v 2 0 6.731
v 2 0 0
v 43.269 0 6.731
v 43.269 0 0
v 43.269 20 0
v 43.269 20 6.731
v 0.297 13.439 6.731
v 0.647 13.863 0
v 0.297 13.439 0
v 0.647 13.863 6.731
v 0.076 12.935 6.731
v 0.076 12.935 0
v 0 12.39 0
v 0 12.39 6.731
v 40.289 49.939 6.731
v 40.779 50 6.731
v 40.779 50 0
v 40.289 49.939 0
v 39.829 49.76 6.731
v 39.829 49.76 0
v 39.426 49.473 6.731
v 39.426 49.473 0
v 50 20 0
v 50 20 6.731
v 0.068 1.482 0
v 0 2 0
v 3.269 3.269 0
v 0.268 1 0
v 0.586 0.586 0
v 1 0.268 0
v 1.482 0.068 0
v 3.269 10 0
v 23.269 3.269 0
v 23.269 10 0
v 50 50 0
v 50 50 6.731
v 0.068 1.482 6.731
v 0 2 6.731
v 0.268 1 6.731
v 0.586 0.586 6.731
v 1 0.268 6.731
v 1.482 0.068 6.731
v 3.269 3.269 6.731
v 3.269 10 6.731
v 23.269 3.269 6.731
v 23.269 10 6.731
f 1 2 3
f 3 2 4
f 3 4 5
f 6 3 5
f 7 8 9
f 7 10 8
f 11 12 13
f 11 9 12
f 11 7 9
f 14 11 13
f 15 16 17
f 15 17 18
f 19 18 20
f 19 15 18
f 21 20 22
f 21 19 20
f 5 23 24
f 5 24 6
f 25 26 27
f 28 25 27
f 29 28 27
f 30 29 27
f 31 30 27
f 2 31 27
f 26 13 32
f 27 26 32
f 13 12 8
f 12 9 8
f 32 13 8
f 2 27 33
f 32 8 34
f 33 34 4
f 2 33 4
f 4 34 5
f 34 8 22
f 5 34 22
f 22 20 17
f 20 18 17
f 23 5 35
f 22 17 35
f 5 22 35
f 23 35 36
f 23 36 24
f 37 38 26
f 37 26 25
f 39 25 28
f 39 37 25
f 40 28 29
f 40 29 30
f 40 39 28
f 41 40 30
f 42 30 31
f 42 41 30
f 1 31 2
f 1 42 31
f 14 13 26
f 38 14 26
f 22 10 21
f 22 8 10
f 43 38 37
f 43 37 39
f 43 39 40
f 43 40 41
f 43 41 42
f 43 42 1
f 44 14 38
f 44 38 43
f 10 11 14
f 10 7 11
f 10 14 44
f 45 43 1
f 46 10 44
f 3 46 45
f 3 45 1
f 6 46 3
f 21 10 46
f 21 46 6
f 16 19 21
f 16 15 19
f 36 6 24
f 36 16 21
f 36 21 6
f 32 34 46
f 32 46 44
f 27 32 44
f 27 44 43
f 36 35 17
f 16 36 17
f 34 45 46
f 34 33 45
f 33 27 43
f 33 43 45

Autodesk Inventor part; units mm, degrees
ref_plane "YZ Plane" through (0, 0, 0) normal (1, 0, 0) x (0, 1, 0)
ref_plane "XZ Plane" through (0, 0, 0) normal (0, 1, 0) x (-1, 0, 0)
ref_plane "XY Plane" through (0, 0, 0) normal (0, 0, 1) x (1, 0, 0)
sketch "Sketch1" plane through (0, 0, 0) normal (0, 0, 1) x (1, 0, 0)
  line L0 (0, 0) -> (43.269, 0)
  line L1 (43.269, 0) -> (43.269, 50)
  line L2 (43.269, 50) -> (50, 50)
  line L3 (50, 50) -> (50, 20)
  line L4 (50, 20) -> (43.269, 20)
  line L5 (43.269, 20) -> (43.269, 50)
  line L6 (3.269, 3.269) -> (23.269, 3.269)
  line L7 (23.269, 3.269) -> (23.269, 10)
  line L8 (23.269, 10) -> (3.269, 10)
  line L9 (3.269, 10) -> (3.269, 3.269)
  line L10 (0, 10) -> (3.269, 10)
  line L11 (23.269, 10) -> (43.269, 10)
  line L12 (43.269, 50) -> (40, 50)
  line L13 (0, 10) -> (0, 0)
  line L14 (0, 10) -> (0, 13.269)
  line L15 (0, 13.269) -> (40, 50)
  point P0 (13.269, 3.269)
  point P1 (13.269, 0)
  dimension "d2" = 30
  dimension "d3" = 20
  dimension "d5" = 6.731
  dimension "d6" = 10
  dimension "d9" = 3.269
  dimension "d11" = 20
  dimension "d12" = 20
  dimension "d14" = 3.269
  dimension "d15" = 3.269
extrude "Extrusion1" add sketch "Sketch1" along normal blind 6.731 contours L13 L10 L9 L6 L7 L11 L1 L0 | L14 L15 L12 L1 L11 L8 L10 | L1 L2 L3 L4
fillet "Fillet1" radius 2 3 edges at (40, 50, 3.3655) (0, 13.269, 3.3655) (0, 0, 3.3655)
equation "\"d5\" = THICKB"
equation "\"d7\" = THICKB"
equation "\"THICKA\" = 3.175"
equation "\"THICKB\" = 6.731"
equation "\"THICKC\" = 12.7"
equation "\"THICKPLY\" = 5"
equation "\"MAGDIA\" = 9.5"
equation "\"BALLDIA\" = 12"
properties part number "Mount_Mega_End"
